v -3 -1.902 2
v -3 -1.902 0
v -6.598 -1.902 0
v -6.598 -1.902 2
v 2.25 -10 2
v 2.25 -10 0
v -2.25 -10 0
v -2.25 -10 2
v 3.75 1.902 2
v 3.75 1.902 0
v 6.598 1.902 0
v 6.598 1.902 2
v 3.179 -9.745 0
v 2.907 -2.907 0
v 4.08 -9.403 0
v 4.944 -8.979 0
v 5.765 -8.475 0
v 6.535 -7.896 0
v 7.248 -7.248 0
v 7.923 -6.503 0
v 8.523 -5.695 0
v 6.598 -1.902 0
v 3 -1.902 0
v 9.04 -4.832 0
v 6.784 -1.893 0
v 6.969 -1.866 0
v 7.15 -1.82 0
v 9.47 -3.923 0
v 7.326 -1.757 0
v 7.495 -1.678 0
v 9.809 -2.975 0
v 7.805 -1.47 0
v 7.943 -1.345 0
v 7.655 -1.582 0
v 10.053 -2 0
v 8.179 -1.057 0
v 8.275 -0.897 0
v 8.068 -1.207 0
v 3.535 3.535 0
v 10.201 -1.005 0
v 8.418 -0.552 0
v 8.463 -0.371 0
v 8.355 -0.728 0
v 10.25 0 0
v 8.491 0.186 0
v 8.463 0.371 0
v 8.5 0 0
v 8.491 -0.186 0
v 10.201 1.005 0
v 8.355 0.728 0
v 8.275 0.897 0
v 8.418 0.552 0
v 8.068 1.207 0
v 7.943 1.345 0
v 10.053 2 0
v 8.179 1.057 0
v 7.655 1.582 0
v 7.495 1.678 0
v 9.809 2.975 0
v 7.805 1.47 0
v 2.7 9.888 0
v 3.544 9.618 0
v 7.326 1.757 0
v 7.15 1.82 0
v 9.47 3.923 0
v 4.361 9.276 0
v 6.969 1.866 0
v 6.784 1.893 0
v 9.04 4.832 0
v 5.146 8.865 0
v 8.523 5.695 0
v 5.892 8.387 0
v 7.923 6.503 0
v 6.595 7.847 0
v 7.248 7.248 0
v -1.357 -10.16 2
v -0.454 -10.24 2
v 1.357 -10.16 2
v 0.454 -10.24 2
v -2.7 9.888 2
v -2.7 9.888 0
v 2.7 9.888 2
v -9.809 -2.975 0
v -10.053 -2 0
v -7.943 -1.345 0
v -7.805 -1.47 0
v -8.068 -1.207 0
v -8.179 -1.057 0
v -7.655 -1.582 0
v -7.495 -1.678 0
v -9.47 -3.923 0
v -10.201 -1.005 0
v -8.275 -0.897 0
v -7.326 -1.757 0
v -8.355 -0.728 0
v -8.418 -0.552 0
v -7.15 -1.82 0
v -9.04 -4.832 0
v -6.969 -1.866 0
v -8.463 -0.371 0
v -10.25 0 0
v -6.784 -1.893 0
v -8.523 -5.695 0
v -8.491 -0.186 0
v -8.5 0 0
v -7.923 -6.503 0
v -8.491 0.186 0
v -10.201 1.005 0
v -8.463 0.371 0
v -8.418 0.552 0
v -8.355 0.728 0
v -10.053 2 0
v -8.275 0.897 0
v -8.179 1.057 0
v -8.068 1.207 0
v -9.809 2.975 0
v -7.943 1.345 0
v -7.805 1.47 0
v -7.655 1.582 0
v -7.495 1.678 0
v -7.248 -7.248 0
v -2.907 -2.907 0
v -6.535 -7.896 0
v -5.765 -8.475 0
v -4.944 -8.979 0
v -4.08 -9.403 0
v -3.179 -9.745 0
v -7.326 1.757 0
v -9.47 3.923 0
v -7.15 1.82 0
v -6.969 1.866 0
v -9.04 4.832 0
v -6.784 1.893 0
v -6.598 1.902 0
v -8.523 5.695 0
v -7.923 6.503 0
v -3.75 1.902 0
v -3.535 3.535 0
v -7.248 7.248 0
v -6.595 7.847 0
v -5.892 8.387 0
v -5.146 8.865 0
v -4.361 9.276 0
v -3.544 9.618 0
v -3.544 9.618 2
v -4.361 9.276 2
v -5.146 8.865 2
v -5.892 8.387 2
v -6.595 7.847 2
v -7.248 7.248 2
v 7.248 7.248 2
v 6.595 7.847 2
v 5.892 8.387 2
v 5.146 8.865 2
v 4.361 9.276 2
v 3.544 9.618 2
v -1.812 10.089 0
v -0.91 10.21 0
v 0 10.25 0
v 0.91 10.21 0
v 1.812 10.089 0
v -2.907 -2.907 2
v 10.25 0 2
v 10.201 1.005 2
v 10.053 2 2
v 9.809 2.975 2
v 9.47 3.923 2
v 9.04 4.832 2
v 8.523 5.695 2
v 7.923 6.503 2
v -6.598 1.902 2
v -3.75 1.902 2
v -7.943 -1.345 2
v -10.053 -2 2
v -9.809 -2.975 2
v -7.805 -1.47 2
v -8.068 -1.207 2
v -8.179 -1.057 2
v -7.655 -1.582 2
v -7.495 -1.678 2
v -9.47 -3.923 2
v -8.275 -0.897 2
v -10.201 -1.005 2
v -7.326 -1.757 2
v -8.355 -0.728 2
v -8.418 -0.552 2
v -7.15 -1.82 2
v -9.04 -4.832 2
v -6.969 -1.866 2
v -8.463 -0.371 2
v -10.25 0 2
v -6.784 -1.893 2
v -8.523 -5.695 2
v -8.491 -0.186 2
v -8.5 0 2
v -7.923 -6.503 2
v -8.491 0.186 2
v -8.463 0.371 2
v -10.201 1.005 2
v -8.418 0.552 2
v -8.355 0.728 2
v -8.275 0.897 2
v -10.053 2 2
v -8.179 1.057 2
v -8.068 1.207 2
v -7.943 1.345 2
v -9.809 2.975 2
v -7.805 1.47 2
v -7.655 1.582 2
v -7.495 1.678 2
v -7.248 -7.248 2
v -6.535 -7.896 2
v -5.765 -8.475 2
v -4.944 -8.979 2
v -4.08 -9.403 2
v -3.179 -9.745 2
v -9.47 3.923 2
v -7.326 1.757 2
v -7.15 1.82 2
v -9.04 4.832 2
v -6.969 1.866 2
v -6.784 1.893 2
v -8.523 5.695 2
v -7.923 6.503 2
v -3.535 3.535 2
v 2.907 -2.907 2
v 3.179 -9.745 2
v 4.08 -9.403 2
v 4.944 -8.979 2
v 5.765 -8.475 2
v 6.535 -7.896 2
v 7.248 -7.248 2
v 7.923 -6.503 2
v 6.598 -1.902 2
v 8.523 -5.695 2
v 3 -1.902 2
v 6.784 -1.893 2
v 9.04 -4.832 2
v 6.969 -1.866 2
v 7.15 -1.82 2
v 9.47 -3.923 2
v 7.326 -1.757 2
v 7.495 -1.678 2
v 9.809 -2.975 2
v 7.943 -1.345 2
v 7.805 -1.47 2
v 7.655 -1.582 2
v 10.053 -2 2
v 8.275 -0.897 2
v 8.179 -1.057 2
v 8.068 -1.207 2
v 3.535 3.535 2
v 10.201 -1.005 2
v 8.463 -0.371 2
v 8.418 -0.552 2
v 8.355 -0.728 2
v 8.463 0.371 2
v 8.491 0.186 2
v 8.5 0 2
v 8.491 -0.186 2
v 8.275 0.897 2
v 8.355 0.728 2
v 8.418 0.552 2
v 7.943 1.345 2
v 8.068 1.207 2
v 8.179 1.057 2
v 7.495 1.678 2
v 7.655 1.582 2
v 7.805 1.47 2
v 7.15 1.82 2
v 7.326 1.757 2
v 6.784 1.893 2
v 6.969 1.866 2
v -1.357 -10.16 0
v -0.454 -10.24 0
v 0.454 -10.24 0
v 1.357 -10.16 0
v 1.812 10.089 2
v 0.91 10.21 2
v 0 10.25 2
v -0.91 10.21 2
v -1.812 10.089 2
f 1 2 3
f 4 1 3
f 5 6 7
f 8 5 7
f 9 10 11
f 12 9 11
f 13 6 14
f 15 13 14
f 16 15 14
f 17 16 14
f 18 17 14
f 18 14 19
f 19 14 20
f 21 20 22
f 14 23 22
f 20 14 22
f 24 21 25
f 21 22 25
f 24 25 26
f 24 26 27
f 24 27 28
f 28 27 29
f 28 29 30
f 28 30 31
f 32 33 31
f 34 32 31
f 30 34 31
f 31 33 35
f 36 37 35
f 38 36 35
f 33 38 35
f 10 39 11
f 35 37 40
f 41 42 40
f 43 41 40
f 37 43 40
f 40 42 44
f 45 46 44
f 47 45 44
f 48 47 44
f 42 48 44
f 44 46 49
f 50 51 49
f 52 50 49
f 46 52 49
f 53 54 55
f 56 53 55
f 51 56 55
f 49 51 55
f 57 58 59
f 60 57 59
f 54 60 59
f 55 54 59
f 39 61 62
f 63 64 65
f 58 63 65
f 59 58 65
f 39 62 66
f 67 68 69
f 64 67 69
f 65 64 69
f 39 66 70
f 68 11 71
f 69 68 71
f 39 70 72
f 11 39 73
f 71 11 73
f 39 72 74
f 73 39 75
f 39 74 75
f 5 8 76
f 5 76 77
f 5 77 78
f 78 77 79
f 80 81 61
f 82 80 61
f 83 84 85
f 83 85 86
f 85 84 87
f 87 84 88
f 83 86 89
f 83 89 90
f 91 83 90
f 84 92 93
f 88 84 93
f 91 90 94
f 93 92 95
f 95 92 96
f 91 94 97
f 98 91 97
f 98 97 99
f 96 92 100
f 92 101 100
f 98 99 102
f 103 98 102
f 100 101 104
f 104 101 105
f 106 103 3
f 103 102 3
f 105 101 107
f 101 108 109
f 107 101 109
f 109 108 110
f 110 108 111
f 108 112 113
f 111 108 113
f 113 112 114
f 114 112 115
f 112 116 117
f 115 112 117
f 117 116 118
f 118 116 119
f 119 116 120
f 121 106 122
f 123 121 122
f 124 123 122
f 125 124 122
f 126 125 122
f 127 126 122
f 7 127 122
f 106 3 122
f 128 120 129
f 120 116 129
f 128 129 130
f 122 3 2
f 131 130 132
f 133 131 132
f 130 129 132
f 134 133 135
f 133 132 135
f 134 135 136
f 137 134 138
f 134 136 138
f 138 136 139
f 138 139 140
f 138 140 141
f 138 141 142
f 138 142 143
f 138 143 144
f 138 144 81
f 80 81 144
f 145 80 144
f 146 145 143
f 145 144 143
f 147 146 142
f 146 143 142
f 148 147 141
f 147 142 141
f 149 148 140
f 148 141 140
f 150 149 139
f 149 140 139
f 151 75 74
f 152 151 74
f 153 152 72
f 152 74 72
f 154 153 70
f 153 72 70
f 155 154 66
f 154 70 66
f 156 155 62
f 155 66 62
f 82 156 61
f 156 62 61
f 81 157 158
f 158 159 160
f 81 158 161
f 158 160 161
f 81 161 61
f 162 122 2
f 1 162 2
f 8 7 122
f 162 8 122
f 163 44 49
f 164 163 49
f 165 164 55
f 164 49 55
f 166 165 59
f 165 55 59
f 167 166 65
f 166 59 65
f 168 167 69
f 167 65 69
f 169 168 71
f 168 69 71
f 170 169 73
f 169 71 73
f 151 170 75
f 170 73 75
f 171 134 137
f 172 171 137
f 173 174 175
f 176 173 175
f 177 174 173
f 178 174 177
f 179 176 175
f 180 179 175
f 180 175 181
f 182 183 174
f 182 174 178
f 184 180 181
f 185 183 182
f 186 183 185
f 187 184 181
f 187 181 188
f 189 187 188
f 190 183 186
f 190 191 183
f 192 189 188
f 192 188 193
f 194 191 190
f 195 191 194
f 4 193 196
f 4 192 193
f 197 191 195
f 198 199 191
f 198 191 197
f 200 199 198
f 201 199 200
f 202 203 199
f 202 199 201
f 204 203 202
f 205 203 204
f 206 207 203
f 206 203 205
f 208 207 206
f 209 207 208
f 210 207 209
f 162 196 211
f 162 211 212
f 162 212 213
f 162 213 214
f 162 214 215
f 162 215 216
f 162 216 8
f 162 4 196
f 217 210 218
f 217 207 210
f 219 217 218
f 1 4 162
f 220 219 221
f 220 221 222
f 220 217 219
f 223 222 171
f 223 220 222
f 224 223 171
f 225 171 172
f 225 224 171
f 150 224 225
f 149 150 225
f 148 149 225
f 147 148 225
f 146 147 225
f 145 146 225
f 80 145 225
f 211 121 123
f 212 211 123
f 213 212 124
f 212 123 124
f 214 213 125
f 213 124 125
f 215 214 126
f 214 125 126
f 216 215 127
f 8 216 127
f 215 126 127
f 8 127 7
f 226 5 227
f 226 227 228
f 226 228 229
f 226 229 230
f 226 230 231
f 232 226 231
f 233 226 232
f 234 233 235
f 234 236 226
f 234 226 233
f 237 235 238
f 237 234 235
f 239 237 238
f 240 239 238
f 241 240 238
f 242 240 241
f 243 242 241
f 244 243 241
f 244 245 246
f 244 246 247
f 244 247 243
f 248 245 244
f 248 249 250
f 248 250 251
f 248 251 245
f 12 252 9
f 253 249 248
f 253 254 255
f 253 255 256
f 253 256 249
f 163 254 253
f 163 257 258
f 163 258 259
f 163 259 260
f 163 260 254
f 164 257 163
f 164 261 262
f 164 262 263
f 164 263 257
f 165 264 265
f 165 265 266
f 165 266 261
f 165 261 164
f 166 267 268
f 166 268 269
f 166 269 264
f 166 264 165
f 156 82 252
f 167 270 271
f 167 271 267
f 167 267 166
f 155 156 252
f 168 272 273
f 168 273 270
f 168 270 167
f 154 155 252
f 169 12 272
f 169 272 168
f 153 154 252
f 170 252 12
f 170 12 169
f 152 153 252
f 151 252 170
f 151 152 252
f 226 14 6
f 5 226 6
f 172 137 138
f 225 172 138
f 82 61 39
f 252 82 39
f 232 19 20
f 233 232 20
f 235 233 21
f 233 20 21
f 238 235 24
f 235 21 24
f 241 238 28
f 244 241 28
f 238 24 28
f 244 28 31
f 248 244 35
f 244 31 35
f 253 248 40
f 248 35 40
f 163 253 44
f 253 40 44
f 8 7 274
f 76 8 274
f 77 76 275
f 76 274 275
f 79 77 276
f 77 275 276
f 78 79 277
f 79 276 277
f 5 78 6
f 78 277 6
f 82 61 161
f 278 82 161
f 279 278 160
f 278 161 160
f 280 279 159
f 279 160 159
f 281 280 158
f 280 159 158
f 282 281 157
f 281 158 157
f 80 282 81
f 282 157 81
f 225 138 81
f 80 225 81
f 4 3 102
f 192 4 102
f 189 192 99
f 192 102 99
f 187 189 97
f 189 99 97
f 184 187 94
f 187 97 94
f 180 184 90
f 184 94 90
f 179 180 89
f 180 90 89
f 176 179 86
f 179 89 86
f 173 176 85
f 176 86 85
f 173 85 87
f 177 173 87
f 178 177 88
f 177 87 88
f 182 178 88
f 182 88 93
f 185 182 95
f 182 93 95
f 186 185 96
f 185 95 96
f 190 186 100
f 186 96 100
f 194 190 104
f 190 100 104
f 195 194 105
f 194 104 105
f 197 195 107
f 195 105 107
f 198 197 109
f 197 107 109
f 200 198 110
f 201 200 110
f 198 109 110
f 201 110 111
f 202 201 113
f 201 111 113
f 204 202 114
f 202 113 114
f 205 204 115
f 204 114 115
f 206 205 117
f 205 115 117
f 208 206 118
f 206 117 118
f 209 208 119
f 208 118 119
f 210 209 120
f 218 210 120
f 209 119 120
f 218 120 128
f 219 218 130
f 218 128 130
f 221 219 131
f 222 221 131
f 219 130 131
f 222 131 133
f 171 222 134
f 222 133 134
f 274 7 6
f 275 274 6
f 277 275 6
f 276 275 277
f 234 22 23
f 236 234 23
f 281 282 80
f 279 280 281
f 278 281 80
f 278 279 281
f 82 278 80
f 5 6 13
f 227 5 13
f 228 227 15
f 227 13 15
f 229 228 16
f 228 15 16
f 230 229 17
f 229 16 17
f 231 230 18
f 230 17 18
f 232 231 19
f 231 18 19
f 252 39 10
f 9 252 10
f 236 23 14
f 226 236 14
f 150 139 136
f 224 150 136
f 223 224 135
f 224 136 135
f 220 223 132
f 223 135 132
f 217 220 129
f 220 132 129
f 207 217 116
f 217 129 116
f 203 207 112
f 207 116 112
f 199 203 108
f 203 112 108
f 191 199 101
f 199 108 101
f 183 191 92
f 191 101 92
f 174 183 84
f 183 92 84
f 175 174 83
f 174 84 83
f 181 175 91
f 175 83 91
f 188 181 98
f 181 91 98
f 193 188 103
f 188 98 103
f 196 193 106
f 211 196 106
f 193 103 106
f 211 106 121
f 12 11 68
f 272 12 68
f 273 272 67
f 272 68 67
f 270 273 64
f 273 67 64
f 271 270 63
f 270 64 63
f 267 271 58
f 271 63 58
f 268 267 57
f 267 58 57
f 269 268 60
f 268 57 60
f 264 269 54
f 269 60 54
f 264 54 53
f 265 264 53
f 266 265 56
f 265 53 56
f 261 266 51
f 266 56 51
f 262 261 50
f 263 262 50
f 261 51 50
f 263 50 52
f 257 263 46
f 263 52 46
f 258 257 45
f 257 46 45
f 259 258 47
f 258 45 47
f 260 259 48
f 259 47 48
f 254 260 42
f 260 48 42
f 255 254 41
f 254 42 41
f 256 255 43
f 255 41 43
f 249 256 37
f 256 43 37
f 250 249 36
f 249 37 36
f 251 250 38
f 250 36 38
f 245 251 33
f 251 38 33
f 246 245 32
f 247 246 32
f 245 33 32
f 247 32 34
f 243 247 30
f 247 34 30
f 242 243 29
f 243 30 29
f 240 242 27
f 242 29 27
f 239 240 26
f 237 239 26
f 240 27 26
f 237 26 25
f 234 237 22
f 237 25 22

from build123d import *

# Parameters (mm, degrees)
F1_DEPTH = 2


with BuildPart() as f1:
    # F0 (on Top) → F1 (new body)
    with BuildSketch(Plane.XY):
        with BuildLine():
            ThreePointArc((2.25, -10), (4.9442747228, -8.9786773784), (7.2478445072, -7.2478445072))
            Line((7.2478445072, -7.2478445072), (2.9069370394, -2.9069370394))
            Line((2.9069370394, -2.9069370394), (2.25, -10))
        make_face()
        with BuildLine():
            ThreePointArc((10.25, 0), (9.4697652082, 3.9225051817), (7.2478445072, 7.2478445072))
            Line((7.2478445072, 7.2478445072), (3.5352700168, 3.5352700168))
            Line((3.5352700168, 3.5352700168), (3.75, 1.9021201406))
            Line((3.75, 1.9021201406), (6.5978798594, 1.9021201406))
            ThreePointArc((6.5978798594, 1.9021201406), (7.9428819094, 1.3450020501), (8.5, 0))
            ThreePointArc((8.5, 0), (7.9428819094, -1.3450020501), (6.5978798594, -1.9021201406))
            Line((6.5978798594, -1.9021201406), (3, -1.9021201406))
            Line((3, -1.9021201406), (2.9069370394, -2.9069370394))
            Line((2.9069370394, -2.9069370394), (7.2478445072, -7.2478445072))
            ThreePointArc((7.2478445072, -7.2478445072), (9.4697652082, -3.9225051817), (10.25, 0))
        make_face()
        with BuildLine():
            ThreePointArc((7.2478445072, 7.2478445072), (5.146115516, 8.8645358083), (2.7, 9.8879977751))
            Line((2.7, 9.8879977751), (3.5352700168, 3.5352700168))
            Line((3.5352700168, 3.5352700168), (7.2478445072, 7.2478445072))
        make_face()
    extrude(amount=F1_DEPTH)


with BuildPart() as f1b:
    # F0 (on Top) → F1, piece 2 (new body)
    with BuildSketch(Plane.XY):
        with BuildLine():
            Line((-2.7, 9.8879977751), (2.7, 9.8879977751))
            ThreePointArc((2.7, 9.8879977751), (0, 10.25), (-2.7, 9.8879977751))
        make_face()
    extrude(amount=F1_DEPTH)


with BuildPart() as f1c:
    # F0 (on Top) → F1, piece 3 (new body)
    with BuildSketch(Plane.XY):
        with BuildLine():
            Line((-3.5352700168, 3.5352700168), (-2.7, 9.8879977751))
            ThreePointArc((-2.7, 9.8879977751), (-5.146115516, 8.8645358083), (-7.2478445072, 7.2478445072))
            Line((-7.2478445072, 7.2478445072), (-3.5352700168, 3.5352700168))
        make_face()
        with BuildLine():
            Line((-3.5352700168, 3.5352700168), (-7.2478445072, 7.2478445072))
            ThreePointArc((-7.2478445072, 7.2478445072), (-10.25, 0), (-7.2478445072, -7.2478445072))
            Line((-7.2478445072, -7.2478445072), (-2.9069370394, -2.9069370394))
            Line((-2.9069370394, -2.9069370394), (-3, -1.9021201406))
            Line((-3, -1.9021201406), (-6.5978798594, -1.9021201406))
            ThreePointArc((-6.5978798594, -1.9021201406), (-8.5, 0), (-6.5978798594, 1.9021201406))
            Line((-6.5978798594, 1.9021201406), (-3.75, 1.9021201406))
            Line((-3.75, 1.9021201406), (-3.5352700168, 3.5352700168))
        make_face()
        with BuildLine():
            Line((-2.9069370394, -2.9069370394), (-7.2478445072, -7.2478445072))
            ThreePointArc((-7.2478445072, -7.2478445072), (-4.9442747228, -8.9786773784), (-2.25, -10))
            Line((-2.25, -10), (-2.9069370394, -2.9069370394))
        make_face()
    extrude(amount=F1_DEPTH)


with BuildPart() as f1d:
    # F0 (on Top) → F1, piece 4 (new body)
    with BuildSketch(Plane.XY):
        with BuildLine():
            Line((0, -10), (-2.25, -10))
            ThreePointArc((-2.25, -10), (0, -10.25), (2.25, -10))
            Line((2.25, -10), (0, -10))
        make_face()
    extrude(amount=F1_DEPTH)


solid = Compound([f1.part, f1b.part, f1c.part, f1d.part])
